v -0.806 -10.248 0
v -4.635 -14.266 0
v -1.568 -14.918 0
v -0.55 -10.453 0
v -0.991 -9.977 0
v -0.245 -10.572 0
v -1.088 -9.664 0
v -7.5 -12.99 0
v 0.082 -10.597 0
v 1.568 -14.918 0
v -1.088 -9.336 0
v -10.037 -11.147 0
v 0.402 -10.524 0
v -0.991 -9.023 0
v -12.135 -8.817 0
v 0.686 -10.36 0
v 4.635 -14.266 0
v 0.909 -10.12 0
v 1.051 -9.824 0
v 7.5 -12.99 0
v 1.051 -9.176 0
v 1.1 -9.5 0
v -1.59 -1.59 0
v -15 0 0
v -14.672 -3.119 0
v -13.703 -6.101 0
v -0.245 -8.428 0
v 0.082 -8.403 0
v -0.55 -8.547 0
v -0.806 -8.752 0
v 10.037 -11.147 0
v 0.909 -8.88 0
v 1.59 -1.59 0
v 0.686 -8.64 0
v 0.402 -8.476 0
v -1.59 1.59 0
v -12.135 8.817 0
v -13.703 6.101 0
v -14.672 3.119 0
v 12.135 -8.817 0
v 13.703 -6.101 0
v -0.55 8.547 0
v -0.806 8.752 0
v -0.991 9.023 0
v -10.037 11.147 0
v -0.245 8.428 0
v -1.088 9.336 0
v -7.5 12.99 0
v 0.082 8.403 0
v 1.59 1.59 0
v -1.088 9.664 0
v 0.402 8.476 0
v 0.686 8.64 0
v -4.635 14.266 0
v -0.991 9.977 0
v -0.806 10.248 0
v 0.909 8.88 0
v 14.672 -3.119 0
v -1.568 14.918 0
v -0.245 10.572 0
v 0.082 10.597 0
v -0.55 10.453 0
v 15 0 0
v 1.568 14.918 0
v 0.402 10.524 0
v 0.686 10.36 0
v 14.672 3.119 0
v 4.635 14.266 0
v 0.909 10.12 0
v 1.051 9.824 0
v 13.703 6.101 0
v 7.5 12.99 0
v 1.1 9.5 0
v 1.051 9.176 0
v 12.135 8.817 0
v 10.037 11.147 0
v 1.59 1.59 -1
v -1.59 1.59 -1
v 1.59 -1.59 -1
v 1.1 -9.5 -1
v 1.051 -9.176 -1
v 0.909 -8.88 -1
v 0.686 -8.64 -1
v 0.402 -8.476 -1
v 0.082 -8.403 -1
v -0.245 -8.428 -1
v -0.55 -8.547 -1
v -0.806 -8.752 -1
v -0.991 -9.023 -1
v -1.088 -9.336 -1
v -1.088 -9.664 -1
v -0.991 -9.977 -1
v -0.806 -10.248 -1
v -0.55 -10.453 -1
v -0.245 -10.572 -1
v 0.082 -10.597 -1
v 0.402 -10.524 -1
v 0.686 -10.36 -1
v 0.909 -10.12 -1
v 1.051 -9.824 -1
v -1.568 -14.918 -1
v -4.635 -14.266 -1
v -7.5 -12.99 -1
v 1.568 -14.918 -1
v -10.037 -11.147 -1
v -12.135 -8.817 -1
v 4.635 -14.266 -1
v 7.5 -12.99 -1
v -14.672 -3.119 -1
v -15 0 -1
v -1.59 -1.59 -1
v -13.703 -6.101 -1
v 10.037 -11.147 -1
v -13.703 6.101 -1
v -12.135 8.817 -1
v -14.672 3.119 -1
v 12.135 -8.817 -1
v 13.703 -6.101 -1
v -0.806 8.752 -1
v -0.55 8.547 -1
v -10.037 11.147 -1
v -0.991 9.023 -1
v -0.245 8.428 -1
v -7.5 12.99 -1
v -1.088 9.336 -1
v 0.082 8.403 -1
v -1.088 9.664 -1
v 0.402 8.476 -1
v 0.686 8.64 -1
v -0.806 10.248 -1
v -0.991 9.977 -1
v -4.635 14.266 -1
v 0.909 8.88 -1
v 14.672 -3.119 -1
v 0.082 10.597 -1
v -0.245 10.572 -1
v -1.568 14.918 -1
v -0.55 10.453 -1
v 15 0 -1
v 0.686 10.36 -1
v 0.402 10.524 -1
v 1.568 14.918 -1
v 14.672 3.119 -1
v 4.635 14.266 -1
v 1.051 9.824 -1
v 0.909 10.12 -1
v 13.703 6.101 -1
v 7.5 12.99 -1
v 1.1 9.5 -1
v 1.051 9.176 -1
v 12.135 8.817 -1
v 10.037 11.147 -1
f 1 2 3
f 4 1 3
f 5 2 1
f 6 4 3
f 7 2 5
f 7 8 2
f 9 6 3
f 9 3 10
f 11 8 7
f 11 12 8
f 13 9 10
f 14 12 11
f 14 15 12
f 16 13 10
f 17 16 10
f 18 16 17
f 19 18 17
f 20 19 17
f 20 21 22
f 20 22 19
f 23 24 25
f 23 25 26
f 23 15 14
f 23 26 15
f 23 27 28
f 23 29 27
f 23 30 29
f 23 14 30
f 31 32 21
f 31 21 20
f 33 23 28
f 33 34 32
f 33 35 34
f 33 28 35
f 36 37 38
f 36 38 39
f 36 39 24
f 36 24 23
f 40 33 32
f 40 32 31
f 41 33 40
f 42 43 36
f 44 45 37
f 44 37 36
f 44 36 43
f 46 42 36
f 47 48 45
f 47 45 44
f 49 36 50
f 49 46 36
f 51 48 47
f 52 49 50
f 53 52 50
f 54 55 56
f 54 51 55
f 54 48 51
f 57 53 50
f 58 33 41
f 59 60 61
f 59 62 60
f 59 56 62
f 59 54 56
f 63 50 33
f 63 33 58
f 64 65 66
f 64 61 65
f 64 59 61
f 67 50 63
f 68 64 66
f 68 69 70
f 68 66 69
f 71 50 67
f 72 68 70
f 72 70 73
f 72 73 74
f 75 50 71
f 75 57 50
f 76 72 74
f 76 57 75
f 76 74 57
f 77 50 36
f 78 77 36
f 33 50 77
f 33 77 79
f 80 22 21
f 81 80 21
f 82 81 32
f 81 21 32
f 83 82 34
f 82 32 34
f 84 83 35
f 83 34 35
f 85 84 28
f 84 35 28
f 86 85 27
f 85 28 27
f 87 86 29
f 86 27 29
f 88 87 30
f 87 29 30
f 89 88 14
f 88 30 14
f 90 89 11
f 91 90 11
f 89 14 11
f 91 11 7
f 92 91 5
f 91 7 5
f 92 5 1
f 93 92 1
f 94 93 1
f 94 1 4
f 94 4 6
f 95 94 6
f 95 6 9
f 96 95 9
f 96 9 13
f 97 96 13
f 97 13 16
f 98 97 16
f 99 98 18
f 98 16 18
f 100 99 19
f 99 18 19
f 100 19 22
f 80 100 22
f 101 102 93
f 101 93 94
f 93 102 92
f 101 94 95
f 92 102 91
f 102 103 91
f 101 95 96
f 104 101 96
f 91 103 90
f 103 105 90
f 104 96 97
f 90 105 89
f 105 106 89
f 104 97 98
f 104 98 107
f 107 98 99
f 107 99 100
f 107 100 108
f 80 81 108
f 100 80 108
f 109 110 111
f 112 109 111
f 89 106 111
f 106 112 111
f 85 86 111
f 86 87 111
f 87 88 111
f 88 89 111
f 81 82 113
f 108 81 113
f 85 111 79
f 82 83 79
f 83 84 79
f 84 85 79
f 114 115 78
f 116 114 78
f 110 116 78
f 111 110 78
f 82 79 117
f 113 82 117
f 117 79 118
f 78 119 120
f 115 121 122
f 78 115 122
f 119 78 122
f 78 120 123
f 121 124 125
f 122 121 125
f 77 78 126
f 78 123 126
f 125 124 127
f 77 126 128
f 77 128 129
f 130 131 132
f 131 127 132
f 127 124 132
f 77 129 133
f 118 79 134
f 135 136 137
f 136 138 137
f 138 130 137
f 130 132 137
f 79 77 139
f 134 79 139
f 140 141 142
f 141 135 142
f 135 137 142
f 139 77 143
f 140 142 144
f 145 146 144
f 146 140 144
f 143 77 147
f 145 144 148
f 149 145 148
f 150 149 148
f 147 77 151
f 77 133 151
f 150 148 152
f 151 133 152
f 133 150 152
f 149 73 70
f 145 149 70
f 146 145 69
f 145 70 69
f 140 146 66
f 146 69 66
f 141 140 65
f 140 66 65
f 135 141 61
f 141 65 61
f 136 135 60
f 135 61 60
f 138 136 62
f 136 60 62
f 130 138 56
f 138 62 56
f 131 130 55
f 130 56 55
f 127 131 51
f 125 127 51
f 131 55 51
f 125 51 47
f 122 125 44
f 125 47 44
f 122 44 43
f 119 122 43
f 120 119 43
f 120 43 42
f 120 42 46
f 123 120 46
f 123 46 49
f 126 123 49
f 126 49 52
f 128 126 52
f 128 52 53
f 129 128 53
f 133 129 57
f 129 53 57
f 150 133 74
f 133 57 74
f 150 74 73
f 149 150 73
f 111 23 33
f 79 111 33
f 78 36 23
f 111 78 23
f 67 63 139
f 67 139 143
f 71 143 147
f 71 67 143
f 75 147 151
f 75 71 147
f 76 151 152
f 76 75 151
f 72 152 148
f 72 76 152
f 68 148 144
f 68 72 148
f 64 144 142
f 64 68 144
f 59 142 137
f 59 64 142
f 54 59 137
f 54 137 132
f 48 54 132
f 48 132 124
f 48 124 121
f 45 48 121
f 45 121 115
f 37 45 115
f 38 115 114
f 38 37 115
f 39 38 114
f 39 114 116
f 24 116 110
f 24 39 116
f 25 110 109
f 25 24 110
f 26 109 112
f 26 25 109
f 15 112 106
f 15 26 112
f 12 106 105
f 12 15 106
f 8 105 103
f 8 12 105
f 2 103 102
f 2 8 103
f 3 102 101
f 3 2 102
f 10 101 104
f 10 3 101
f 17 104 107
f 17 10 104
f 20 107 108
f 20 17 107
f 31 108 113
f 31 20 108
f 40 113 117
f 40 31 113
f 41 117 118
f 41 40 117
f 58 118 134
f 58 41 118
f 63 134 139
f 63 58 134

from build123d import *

# Parameters (mm, degrees)
SKETCH1_R          = 15
SKETCH1_R_2        = 1.1
BASE_FLANGE1_DEPTH = 1


# Sheet-metal steps are written as plain solids
with BuildPart() as part:
    # Sketch1 → Base-Flange1 (new body)
    with BuildSketch(Plane.XY):
        Circle(SKETCH1_R)
        with Locations((0, 9.5)):
            Circle(SKETCH1_R_2, mode=Mode.SUBTRACT)
        with Locations((0, -9.5)):
            Circle(SKETCH1_R_2, mode=Mode.SUBTRACT)
        Polygon((1.59, 0), (1.59, 1.59), (-1.59, 1.59), (-1.59, -1.59), (1.59, -1.59), align=None, mode=Mode.SUBTRACT)
    extrude(amount=-BASE_FLANGE1_DEPTH)


solid = part.part
